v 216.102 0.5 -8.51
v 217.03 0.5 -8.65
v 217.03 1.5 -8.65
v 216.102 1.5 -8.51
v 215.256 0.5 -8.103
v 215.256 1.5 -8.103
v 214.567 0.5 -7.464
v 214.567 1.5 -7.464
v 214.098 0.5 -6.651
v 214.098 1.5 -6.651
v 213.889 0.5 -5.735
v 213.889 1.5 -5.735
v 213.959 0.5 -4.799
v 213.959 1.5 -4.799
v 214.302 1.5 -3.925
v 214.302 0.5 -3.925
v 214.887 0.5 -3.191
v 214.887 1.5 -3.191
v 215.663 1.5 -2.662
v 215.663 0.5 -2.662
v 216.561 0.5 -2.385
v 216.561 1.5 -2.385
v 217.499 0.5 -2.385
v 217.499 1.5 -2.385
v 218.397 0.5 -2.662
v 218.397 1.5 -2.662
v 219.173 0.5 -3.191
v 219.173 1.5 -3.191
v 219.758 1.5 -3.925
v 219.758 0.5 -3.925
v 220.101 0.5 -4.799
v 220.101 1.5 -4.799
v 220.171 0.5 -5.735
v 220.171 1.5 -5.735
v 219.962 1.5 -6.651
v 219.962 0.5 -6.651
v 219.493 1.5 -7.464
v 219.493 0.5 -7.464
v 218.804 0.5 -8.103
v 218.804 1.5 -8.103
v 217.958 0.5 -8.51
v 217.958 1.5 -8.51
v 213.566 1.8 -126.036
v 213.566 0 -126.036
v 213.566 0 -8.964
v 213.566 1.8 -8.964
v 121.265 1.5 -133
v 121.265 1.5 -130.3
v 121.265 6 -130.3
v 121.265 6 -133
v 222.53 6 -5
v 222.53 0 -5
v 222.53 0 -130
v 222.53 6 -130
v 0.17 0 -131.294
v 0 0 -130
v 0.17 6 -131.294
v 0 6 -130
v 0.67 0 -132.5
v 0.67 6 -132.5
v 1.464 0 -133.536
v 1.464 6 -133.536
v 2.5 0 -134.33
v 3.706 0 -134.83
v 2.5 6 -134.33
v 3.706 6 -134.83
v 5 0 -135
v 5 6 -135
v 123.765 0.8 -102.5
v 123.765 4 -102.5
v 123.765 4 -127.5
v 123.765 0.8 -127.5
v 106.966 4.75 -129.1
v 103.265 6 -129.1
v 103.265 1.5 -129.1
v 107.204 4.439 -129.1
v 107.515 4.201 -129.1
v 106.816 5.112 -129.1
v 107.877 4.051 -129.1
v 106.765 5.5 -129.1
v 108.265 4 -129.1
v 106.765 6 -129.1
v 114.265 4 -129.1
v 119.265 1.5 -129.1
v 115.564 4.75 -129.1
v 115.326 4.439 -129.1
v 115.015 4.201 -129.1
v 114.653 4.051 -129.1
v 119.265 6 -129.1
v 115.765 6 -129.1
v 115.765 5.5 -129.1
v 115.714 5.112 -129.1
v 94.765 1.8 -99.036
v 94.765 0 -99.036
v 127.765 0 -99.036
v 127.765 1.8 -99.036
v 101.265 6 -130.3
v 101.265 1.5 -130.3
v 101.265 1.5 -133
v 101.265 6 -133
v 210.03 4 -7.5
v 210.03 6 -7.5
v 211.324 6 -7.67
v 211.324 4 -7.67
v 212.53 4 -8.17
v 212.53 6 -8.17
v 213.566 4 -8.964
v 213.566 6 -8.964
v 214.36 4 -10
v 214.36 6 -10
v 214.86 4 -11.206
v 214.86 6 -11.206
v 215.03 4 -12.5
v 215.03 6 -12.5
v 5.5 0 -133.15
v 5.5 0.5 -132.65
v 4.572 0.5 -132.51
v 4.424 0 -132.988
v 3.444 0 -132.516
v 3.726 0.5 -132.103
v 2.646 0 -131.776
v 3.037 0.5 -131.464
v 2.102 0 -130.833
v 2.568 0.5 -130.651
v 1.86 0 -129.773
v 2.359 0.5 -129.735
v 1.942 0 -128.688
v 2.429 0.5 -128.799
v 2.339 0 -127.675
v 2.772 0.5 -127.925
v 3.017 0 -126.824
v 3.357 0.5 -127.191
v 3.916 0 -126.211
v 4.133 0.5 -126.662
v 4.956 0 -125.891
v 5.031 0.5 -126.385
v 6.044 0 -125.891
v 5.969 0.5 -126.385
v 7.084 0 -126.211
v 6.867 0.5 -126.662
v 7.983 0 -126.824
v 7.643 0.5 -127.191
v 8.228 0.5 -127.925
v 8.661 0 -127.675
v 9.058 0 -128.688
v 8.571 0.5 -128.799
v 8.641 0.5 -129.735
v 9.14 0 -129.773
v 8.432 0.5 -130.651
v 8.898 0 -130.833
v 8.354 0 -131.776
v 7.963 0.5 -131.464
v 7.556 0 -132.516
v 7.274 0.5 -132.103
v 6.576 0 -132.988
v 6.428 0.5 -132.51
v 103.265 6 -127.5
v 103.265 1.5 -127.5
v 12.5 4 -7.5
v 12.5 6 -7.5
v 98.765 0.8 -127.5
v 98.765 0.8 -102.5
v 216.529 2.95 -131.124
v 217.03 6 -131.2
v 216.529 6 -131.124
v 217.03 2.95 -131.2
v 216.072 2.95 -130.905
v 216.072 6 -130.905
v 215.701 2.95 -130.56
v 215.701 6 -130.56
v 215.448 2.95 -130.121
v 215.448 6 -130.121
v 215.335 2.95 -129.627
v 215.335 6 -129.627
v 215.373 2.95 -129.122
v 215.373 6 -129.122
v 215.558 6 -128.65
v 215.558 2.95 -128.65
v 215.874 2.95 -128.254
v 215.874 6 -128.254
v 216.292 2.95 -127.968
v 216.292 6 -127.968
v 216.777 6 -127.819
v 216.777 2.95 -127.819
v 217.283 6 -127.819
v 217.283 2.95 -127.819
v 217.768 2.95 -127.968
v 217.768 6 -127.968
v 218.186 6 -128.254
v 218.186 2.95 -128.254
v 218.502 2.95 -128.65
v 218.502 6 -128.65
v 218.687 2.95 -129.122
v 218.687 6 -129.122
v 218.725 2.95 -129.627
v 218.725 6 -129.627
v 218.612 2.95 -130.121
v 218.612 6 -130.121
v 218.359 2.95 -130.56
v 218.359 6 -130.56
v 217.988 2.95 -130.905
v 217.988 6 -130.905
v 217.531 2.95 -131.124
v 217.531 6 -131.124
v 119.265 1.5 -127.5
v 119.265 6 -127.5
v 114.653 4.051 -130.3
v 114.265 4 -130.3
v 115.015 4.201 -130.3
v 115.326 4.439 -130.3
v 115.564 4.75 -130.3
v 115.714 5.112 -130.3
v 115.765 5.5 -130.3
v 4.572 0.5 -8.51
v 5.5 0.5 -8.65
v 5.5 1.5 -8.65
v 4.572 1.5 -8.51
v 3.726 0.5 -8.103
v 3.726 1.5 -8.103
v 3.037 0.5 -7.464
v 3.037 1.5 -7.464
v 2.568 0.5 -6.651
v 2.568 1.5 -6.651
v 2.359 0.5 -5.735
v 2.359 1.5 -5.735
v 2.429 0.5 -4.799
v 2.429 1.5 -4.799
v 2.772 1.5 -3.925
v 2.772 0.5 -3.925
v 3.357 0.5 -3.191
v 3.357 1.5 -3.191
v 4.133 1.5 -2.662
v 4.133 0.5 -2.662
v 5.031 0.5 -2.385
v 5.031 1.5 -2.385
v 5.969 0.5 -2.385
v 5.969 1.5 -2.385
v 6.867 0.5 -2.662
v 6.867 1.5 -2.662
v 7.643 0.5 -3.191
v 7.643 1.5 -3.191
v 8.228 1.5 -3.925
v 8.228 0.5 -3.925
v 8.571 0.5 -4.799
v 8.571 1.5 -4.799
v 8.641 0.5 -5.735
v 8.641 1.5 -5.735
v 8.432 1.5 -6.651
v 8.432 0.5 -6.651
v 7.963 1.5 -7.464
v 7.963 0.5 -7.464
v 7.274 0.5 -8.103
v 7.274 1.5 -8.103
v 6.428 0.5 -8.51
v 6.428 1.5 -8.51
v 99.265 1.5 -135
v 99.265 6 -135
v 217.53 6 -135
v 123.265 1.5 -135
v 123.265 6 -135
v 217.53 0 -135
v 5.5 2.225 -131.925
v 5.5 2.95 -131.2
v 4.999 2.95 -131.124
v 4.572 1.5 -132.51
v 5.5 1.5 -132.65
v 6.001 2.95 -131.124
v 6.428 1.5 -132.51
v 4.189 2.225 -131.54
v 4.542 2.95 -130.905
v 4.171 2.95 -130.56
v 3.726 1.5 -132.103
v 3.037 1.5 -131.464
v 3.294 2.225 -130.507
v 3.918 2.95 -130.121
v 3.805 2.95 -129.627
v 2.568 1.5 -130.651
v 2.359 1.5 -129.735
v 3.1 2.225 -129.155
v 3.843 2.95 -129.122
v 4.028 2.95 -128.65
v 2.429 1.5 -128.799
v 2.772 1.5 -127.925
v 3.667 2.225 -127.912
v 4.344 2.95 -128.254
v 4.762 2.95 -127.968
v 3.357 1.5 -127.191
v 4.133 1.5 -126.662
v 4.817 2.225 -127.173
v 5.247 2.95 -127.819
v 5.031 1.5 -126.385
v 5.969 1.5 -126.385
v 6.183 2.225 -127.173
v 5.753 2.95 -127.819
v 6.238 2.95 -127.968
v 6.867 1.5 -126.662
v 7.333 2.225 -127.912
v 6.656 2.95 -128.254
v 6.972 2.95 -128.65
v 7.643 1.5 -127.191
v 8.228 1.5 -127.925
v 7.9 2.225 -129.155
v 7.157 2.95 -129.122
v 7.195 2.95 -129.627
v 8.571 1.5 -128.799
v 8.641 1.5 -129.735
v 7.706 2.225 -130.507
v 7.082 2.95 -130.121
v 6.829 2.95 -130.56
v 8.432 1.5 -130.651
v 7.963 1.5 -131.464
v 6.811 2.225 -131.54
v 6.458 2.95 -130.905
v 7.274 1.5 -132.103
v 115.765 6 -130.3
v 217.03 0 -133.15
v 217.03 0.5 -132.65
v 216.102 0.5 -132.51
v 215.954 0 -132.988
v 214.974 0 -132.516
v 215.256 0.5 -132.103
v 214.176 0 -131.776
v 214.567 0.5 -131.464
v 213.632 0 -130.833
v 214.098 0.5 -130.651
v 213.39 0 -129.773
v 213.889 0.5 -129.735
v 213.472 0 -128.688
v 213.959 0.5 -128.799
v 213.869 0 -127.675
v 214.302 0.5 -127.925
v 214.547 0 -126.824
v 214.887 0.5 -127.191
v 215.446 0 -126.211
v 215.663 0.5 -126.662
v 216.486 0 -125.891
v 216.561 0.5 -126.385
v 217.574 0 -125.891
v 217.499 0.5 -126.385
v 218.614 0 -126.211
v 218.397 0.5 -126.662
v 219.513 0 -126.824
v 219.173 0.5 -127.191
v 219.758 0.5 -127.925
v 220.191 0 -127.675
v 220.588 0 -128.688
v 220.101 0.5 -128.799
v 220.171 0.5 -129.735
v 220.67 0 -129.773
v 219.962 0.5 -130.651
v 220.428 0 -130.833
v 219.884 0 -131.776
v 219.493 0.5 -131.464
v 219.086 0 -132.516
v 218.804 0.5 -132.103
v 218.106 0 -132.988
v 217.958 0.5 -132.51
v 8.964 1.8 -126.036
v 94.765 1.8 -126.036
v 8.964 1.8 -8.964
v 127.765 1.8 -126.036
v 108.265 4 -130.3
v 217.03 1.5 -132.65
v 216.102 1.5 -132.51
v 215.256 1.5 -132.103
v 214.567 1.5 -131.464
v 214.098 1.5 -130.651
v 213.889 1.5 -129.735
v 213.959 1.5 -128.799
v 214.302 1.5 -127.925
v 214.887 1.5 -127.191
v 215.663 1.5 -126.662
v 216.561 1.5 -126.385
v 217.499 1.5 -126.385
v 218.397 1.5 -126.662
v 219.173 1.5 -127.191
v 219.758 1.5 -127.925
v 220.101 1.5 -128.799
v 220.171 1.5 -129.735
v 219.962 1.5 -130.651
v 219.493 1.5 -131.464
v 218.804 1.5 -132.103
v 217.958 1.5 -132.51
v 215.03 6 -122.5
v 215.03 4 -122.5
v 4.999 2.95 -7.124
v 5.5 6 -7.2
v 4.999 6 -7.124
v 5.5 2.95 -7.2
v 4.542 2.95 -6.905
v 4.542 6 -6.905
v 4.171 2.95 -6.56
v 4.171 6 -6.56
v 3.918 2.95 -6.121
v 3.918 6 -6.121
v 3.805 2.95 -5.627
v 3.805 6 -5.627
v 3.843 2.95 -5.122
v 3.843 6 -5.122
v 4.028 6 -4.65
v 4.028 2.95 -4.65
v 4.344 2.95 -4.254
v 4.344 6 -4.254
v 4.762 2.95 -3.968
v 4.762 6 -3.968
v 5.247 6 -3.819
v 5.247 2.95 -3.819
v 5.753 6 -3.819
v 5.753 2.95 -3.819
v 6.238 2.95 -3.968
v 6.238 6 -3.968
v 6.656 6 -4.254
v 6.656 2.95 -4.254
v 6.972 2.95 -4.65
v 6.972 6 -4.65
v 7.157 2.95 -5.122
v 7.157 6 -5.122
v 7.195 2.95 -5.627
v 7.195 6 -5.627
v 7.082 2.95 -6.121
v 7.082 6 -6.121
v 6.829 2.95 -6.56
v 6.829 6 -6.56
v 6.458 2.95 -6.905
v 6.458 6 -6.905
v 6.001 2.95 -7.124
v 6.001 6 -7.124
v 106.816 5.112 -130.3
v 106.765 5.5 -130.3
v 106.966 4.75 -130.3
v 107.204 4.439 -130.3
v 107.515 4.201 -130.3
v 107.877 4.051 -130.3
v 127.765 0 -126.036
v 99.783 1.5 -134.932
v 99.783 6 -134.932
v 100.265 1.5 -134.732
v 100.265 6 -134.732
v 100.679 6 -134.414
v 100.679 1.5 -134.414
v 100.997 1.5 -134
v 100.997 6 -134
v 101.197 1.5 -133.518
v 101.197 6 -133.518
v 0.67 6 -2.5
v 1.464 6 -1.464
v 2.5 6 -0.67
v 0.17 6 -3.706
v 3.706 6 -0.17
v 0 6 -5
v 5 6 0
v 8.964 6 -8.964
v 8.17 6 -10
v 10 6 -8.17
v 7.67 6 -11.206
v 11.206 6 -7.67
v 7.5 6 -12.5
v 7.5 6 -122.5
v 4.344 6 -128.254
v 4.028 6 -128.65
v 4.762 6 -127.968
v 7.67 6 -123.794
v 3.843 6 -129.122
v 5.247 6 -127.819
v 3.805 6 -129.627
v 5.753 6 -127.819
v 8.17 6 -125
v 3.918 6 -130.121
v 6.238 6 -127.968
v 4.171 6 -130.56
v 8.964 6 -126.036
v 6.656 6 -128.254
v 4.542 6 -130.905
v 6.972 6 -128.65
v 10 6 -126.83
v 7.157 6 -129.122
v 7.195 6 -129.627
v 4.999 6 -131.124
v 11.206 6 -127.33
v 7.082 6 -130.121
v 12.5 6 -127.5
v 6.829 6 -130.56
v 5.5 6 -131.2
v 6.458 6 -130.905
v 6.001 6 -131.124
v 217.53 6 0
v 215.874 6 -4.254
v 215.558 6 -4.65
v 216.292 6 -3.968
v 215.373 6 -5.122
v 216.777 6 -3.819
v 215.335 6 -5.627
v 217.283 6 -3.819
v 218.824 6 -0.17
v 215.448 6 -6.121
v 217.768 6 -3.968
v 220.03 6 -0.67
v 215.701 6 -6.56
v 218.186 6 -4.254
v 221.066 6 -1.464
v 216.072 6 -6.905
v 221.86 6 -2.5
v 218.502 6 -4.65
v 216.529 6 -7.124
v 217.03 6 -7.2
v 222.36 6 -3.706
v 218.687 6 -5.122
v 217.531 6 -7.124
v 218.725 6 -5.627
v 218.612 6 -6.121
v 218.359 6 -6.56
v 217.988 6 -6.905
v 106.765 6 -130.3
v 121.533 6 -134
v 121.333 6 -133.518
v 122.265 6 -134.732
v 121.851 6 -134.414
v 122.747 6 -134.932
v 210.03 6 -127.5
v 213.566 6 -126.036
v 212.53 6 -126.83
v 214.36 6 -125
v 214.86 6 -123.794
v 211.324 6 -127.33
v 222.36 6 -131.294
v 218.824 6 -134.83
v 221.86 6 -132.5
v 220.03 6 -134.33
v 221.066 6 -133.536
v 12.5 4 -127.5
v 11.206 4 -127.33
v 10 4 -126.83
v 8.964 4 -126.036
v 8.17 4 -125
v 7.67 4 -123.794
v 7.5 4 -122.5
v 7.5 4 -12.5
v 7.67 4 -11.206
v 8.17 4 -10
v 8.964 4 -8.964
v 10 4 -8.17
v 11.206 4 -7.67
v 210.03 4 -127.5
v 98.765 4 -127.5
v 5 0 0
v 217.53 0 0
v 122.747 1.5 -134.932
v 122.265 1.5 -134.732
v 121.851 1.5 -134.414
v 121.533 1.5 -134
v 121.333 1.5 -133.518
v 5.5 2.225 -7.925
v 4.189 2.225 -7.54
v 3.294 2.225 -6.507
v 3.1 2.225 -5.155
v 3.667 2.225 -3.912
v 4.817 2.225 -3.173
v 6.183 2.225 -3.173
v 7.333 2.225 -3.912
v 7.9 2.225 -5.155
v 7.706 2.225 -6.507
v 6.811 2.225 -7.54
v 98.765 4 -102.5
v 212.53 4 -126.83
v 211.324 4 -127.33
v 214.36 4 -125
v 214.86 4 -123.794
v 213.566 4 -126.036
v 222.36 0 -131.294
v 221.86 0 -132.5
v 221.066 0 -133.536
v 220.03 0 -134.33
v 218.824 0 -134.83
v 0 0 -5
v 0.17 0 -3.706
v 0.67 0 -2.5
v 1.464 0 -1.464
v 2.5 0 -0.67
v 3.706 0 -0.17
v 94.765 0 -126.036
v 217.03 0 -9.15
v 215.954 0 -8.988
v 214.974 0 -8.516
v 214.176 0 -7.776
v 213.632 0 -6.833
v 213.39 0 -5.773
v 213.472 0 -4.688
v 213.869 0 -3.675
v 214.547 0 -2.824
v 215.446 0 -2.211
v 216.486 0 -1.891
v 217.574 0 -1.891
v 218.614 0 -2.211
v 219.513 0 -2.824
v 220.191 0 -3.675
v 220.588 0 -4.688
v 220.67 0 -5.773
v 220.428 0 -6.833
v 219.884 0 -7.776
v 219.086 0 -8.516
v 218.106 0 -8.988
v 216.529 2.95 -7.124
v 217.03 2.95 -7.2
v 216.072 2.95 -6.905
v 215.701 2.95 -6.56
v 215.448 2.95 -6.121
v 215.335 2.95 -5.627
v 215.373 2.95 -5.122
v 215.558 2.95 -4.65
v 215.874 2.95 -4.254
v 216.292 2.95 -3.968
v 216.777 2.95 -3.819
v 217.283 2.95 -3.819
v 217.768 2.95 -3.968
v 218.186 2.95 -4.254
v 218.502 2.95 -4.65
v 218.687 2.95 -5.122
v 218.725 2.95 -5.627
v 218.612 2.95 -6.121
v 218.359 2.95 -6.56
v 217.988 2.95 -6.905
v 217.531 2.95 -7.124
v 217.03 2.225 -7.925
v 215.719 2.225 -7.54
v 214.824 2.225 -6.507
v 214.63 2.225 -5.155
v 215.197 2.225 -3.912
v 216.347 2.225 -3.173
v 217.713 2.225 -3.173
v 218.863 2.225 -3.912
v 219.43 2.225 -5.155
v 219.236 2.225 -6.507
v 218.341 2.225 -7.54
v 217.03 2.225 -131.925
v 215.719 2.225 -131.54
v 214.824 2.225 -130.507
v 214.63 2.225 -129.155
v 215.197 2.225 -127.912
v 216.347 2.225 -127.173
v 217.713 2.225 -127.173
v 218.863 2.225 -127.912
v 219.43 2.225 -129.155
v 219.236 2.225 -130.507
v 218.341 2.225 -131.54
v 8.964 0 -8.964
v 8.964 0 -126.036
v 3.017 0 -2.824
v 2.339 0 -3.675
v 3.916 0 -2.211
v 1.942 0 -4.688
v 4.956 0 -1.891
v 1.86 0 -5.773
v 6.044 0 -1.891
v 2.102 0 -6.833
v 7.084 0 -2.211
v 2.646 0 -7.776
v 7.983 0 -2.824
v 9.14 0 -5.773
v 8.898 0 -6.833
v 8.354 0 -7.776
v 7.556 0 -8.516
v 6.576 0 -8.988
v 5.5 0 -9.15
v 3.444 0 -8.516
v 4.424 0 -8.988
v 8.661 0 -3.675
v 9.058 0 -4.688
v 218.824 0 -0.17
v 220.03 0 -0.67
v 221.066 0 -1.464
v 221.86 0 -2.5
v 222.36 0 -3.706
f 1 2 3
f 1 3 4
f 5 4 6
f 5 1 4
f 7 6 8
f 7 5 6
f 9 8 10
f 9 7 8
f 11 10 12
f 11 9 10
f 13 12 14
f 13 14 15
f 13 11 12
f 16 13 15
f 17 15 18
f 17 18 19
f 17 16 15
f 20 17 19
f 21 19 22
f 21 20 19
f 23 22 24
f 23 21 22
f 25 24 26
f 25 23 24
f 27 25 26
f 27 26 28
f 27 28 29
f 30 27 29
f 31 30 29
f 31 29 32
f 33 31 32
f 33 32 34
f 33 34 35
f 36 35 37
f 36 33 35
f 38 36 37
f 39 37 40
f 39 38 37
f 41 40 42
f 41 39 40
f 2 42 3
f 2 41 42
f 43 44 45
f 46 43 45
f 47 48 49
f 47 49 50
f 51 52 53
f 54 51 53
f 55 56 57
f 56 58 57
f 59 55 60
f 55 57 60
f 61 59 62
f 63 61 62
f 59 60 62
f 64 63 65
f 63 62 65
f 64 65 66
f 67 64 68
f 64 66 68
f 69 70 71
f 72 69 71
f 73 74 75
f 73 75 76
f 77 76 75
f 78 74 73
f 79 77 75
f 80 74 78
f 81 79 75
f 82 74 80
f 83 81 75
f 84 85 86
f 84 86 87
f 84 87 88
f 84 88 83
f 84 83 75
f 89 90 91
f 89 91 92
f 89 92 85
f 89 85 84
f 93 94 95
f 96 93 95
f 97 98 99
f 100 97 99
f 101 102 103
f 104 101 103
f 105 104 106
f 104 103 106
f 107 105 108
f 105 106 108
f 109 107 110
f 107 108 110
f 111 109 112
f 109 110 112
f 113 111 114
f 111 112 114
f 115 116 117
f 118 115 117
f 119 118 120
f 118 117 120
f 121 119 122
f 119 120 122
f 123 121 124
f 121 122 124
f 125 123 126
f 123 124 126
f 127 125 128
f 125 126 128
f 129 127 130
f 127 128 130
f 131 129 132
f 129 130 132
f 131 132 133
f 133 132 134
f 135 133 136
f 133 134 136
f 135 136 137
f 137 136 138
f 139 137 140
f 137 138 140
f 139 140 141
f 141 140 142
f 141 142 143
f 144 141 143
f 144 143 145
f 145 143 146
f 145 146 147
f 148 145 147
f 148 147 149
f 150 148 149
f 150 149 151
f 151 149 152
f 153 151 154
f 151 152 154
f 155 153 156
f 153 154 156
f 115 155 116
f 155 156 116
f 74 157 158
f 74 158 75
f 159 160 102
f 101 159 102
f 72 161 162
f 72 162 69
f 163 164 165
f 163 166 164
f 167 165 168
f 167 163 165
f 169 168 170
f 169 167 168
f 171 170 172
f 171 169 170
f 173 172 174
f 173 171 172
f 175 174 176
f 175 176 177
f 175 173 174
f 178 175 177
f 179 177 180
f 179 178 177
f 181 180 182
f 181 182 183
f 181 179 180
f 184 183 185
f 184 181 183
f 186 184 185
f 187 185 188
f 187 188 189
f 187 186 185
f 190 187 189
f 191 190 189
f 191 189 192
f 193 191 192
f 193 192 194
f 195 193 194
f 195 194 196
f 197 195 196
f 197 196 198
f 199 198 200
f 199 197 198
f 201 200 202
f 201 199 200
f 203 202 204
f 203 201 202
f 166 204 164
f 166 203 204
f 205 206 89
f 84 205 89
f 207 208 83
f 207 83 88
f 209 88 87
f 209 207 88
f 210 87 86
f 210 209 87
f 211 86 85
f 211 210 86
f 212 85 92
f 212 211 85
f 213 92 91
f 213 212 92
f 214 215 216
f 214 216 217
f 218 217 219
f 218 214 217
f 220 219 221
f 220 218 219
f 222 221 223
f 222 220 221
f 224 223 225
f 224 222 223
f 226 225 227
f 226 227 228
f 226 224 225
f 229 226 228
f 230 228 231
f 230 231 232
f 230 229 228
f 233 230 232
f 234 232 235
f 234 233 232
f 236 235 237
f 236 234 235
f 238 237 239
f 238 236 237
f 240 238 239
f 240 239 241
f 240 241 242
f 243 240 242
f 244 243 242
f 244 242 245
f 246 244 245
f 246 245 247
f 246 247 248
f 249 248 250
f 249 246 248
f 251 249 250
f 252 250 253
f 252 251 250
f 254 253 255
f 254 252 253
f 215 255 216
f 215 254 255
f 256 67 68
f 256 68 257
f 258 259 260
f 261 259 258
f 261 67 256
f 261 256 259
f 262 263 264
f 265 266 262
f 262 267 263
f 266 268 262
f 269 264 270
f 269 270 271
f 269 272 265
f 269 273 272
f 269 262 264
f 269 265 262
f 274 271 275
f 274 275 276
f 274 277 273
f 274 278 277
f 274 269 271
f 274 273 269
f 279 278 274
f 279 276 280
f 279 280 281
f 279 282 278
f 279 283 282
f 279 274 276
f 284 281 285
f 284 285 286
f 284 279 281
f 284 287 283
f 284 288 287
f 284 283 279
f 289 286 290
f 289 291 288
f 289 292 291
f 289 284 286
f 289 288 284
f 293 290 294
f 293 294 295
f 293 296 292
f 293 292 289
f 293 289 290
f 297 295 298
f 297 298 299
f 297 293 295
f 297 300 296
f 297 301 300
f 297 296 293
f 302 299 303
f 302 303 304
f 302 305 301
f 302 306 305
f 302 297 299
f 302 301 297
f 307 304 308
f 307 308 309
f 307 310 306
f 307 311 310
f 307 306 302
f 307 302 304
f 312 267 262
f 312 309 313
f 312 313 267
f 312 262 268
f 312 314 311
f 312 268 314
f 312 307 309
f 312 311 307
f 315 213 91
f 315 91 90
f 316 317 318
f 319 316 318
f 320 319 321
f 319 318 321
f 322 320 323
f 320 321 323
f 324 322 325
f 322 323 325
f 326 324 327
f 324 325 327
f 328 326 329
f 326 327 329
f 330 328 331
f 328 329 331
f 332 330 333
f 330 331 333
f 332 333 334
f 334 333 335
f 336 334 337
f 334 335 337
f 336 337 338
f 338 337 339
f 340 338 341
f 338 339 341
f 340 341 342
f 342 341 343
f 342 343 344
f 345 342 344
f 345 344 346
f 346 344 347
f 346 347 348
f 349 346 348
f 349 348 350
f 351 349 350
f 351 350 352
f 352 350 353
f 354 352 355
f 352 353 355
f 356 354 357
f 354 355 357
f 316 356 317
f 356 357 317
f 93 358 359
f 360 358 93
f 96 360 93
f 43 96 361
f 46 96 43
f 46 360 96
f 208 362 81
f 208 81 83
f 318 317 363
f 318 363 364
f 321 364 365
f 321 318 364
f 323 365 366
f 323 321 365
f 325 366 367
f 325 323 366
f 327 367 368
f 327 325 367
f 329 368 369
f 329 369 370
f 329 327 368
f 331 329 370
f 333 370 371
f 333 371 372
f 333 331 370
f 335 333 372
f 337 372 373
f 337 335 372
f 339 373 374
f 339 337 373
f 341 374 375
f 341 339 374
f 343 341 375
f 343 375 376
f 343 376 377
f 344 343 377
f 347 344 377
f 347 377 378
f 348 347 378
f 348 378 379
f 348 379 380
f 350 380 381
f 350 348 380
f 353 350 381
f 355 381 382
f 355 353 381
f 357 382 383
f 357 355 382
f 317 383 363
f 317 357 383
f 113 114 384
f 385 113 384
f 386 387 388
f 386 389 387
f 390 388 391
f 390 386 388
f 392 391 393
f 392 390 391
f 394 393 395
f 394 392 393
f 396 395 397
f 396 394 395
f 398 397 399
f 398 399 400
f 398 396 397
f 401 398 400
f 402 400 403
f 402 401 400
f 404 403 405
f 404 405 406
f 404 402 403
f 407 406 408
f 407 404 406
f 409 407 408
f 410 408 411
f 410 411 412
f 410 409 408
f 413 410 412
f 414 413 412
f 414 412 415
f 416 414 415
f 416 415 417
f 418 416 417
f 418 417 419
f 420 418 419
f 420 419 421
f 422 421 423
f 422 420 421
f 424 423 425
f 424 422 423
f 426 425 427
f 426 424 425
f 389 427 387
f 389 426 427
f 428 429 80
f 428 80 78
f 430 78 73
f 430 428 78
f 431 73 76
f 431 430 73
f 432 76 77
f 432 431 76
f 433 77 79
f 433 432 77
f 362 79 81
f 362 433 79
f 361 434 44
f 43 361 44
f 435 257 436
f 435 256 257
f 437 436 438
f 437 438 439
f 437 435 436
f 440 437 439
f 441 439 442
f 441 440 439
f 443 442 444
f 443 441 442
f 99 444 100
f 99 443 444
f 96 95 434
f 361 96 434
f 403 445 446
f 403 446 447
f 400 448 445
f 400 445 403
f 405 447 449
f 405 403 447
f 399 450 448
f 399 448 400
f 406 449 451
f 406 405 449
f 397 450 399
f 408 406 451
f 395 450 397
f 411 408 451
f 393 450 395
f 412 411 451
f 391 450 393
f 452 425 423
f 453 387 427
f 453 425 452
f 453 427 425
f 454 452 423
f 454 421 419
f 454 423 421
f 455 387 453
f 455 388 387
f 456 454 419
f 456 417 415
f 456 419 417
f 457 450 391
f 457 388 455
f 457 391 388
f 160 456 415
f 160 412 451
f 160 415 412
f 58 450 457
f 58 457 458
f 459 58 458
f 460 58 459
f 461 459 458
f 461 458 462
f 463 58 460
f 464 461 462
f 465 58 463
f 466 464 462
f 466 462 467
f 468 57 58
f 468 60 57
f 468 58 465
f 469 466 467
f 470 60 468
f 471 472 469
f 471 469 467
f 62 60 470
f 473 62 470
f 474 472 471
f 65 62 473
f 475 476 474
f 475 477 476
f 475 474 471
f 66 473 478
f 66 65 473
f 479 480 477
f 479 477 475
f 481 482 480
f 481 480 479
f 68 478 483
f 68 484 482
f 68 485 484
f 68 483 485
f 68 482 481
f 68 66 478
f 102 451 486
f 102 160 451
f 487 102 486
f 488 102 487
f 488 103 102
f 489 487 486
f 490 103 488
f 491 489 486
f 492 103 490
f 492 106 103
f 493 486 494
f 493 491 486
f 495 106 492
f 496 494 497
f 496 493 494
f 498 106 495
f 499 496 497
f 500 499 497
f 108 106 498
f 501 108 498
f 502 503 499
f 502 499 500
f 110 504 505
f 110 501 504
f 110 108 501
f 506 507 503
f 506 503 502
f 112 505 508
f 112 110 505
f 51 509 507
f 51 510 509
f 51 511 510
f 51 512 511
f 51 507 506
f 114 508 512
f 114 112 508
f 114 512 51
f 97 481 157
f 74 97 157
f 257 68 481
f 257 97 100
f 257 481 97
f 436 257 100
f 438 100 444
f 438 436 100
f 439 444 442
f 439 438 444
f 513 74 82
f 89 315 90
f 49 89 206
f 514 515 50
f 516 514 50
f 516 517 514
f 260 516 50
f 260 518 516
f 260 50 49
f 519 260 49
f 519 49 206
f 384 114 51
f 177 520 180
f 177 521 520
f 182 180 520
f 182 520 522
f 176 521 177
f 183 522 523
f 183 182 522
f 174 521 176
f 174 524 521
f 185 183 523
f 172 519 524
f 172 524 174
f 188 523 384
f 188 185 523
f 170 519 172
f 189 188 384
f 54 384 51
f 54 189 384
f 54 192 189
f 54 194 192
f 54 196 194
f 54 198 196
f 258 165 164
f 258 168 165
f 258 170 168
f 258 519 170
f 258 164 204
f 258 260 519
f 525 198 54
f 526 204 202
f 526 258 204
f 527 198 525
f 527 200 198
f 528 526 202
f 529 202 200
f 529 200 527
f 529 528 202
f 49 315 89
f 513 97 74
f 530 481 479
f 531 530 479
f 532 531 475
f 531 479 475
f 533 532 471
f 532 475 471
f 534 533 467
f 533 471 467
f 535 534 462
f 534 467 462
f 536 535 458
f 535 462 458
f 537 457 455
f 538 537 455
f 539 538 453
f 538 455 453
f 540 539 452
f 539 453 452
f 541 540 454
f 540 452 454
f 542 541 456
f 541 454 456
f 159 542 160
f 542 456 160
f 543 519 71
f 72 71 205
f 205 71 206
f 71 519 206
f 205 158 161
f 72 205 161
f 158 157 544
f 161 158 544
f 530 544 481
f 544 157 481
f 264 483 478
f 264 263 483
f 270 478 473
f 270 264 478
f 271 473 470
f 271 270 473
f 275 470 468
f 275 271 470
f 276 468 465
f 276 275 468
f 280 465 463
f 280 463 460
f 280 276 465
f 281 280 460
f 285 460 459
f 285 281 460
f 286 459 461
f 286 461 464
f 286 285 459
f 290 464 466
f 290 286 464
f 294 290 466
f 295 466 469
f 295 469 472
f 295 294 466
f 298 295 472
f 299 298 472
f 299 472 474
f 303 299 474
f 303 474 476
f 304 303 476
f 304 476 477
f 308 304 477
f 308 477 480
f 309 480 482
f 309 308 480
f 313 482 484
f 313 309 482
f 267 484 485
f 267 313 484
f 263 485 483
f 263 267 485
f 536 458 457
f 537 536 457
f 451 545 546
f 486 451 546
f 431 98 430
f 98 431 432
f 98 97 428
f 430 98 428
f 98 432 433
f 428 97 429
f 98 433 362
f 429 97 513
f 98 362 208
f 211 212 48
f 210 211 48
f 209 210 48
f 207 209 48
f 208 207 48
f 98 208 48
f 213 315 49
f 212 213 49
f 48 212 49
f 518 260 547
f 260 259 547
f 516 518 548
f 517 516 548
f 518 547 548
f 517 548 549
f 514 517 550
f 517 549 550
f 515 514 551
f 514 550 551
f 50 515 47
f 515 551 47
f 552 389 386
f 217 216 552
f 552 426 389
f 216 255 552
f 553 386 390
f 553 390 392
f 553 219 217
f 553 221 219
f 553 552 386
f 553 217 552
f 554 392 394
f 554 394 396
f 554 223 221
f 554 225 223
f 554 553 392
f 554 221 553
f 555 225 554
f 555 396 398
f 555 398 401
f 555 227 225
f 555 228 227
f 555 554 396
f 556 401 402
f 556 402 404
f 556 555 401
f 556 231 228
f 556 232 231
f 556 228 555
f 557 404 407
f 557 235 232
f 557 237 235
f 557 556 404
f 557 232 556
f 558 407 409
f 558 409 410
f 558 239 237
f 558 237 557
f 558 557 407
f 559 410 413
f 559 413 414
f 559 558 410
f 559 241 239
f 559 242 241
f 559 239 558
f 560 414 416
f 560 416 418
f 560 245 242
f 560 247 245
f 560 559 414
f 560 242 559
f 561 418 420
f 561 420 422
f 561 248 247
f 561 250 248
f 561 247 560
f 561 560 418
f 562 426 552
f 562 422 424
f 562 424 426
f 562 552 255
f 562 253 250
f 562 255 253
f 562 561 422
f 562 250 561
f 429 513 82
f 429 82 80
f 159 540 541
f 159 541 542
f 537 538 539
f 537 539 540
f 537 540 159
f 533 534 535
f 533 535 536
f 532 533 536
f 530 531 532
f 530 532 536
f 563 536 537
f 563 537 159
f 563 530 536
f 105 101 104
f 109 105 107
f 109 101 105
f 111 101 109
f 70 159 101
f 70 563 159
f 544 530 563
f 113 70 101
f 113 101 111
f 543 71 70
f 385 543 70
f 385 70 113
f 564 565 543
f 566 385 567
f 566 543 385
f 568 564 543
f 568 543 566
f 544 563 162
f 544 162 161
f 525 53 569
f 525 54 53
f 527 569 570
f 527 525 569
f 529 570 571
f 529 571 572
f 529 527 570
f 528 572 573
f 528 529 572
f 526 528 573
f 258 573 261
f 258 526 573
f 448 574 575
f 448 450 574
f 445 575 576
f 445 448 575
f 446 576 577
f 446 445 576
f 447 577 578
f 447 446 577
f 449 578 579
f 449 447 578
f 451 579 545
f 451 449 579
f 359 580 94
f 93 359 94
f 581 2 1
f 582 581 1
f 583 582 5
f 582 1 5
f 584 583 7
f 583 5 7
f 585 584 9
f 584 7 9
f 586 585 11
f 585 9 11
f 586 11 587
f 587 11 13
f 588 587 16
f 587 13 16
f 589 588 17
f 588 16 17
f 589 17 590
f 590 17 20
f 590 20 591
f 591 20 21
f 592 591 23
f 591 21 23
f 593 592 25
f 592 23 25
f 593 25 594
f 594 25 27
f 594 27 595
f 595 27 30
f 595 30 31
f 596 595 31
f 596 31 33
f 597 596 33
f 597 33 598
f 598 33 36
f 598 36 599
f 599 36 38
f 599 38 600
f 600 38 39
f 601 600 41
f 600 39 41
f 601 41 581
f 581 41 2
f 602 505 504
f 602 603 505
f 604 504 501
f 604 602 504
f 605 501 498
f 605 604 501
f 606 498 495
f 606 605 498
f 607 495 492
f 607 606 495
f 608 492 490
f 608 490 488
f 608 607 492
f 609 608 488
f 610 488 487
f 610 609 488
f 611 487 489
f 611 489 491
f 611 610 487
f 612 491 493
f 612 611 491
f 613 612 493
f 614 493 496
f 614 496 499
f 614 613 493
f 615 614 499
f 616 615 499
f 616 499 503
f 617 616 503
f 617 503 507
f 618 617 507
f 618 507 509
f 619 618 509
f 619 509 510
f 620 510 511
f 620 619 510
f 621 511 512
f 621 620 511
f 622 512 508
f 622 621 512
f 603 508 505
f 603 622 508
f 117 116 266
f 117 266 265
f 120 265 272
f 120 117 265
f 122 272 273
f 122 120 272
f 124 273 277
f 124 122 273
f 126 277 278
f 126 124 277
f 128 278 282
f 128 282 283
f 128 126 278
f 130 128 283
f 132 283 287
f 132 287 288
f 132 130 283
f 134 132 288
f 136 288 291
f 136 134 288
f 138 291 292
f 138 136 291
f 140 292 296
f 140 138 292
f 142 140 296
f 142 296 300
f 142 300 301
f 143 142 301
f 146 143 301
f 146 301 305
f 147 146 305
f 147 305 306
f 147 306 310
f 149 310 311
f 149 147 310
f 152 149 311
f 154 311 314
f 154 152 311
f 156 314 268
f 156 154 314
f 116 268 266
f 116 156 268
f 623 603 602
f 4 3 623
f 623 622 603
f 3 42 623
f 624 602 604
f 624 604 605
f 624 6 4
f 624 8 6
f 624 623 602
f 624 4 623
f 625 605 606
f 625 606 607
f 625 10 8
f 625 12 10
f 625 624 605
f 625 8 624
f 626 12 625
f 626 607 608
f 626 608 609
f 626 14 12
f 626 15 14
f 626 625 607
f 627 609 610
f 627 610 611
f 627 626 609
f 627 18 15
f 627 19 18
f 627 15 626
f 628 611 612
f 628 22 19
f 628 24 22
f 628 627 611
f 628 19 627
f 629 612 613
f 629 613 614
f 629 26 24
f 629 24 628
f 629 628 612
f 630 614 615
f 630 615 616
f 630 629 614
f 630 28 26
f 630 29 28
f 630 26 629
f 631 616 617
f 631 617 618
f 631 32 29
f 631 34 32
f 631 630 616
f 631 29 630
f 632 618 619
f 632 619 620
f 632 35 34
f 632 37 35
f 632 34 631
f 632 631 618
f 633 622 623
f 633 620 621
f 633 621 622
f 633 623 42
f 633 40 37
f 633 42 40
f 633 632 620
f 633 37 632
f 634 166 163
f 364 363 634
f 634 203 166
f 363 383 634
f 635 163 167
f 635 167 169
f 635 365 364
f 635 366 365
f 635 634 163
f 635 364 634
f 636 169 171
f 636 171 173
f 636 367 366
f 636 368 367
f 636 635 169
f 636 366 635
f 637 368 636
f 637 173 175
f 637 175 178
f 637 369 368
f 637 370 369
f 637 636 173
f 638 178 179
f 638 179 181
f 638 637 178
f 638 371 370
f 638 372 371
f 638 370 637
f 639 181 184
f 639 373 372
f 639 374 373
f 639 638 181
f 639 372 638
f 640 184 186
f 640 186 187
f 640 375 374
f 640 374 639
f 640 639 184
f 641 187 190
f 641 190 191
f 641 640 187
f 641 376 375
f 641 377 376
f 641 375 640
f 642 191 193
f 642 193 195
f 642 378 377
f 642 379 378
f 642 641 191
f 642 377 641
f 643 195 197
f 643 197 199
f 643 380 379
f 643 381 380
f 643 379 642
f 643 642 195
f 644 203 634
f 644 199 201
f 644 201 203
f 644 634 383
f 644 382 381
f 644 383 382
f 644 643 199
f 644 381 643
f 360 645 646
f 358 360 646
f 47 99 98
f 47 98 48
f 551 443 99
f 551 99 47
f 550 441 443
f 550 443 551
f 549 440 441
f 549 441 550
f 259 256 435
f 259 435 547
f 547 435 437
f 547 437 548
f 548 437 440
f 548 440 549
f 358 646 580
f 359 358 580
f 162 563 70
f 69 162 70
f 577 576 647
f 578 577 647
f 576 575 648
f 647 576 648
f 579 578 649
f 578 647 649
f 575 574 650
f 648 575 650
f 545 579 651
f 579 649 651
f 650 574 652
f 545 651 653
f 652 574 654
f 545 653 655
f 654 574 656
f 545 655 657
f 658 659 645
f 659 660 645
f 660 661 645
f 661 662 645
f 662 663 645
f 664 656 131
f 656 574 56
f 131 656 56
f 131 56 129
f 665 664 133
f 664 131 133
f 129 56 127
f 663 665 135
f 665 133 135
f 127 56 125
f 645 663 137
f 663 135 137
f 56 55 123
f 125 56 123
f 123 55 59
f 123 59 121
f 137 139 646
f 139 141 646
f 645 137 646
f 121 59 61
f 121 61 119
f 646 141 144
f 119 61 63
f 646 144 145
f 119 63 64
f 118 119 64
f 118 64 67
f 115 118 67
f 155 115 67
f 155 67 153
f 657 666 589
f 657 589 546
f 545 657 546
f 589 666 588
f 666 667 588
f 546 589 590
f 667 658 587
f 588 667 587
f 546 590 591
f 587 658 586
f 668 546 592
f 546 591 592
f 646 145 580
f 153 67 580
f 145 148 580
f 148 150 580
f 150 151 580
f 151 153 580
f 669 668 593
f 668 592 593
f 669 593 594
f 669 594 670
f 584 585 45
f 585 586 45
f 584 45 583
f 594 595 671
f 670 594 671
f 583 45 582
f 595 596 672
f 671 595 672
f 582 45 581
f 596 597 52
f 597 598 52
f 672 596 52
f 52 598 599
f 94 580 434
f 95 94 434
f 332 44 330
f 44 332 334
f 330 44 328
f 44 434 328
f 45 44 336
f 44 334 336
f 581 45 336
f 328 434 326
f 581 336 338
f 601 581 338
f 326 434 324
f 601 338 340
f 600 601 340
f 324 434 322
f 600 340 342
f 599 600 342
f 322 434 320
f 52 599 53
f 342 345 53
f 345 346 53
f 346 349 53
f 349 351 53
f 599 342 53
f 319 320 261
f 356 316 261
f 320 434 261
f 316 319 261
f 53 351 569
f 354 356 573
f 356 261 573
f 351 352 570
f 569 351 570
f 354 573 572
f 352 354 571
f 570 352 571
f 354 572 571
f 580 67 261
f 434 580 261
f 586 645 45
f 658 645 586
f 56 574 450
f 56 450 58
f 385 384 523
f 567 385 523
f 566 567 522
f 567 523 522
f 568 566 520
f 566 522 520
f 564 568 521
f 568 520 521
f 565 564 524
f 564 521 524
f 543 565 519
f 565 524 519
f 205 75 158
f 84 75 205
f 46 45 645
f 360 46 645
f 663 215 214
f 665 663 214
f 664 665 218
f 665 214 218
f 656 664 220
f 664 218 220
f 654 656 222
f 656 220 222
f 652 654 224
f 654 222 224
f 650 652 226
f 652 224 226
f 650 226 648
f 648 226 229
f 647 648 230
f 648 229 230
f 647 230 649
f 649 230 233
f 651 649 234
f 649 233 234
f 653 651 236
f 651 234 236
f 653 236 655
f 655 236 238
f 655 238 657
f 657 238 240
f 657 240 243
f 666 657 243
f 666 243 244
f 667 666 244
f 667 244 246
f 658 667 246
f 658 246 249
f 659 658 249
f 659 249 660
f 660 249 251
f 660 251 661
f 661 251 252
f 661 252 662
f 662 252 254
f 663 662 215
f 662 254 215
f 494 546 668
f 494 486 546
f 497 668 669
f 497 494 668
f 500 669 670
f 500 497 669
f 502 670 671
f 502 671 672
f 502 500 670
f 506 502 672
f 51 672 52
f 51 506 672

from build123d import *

# Parameters (mm, degrees)
SKETCH1_W                                      = 222.53
SKETCH1_H                                      = 135
BOSS_EXTRUDE1_DEPTH                            = 6
FILLET1_R                                      = 5
CSK_FOR_M3_FLAT_HEAD_MACHINE_SCREW1_AT_2_COUNT = 2
CSK_FOR_M3_FLAT_HEAD_MACHINE_SCREW1_AT_2_PITCH = 211.53
CSK_FOR_M3_FLAT_HEAD_MACHINE_SCREW1_AT_3_COUNT = 2
CSK_FOR_M3_FLAT_HEAD_MACHINE_SCREW1_AT_3_PITCH = 245.195719579
CSK_FOR_M3_FLAT_HEAD_MACHINE_SCREW1_AT_4_COUNT = 2
CSK_FOR_M3_FLAT_HEAD_MACHINE_SCREW1_AT_4_PITCH = 124
CHAMFER1_SIZE                                  = 0.5
PCB_CUTOUT_DEPTH                               = 2
SKETCH8_W                                      = 20
SKETCH8_H                                      = 4.7
SKETCH8_W_2                                    = 16
SKETCH8_H_2                                    = 1.6
CABLE_RELIEF_DEPTH                             = 4.5
SKETCH9_W                                      = 25
SKETCH9_H                                      = 25
PI_CUTOUT_DEPTH                                = 3.2
USB_C_CUTOUT_REACH                             = 137
MOUSE_PAD_CUTOUT_DEPTH                         = 1.8
FILLET2_R                                      = 2


with BuildPart() as part:
    # Sketch1 → Boss-Extrude1 (new body)
    with BuildSketch(Plane(origin=(0, 0, 0), x_dir=(1, 0, 0), z_dir=(0, 1, 0))):
        with Locations((111.265, 67.5)):
            Rectangle(SKETCH1_W, SKETCH1_H)
    extrude(amount=BOSS_EXTRUDE1_DEPTH)

    # Fillet1
    fillet1_edges = [part.edges().sort_by_distance(p)[0] for p in [
        (0, 3, -135),
        (222.53, 3, -135),
        (222.53, 3, 0),
        (0, 3, 0),
    ]]
    fillet(fillet1_edges, radius=FILLET1_R)

    # Sketch4 → CSK for M3 Flat Head Machine Screw1 (revolve, cut)
    with BuildSketch(Plane(origin=(5.5, 0, -129.5), x_dir=(0, 0, -1), z_dir=(1, 0, 0))):
        Polygon((0, 0), (0, 6), (1.7, 6), (1.7, 2.95), (3.15, 1.5), (3.15, 0), align=None)
    csk_for_m3_flat_head_machine_screw1 = revolve(axis=Axis((5.5, -6.35, -129.5), (0, 1, 0)), mode=Mode.SUBTRACT)

    # CSK for M3 Flat Head Machine Screw1 at 2: CSK for M3 Flat Head Machine Screw1 ×2
    with Locations(*[(i * CSK_FOR_M3_FLAT_HEAD_MACHINE_SCREW1_AT_2_PITCH, 0, 0) for i in range(1, CSK_FOR_M3_FLAT_HEAD_MACHINE_SCREW1_AT_2_COUNT)]):
        add(csk_for_m3_flat_head_machine_screw1, mode=Mode.SUBTRACT)

    # CSK for M3 Flat Head Machine Screw1 at 3: CSK for M3 Flat Head Machine Screw1 ×2
    with Locations(*[Vector(0.862698584, 0, 0.505718453) * (i * CSK_FOR_M3_FLAT_HEAD_MACHINE_SCREW1_AT_3_PITCH) for i in range(1, CSK_FOR_M3_FLAT_HEAD_MACHINE_SCREW1_AT_3_COUNT)]):
        add(csk_for_m3_flat_head_machine_screw1, mode=Mode.SUBTRACT)

    # CSK for M3 Flat Head Machine Screw1 at 4: CSK for M3 Flat Head Machine Screw1 ×2
    with Locations(*[(0, 0, i * CSK_FOR_M3_FLAT_HEAD_MACHINE_SCREW1_AT_4_PITCH) for i in range(1, CSK_FOR_M3_FLAT_HEAD_MACHINE_SCREW1_AT_4_COUNT)]):
        add(csk_for_m3_flat_head_machine_screw1, mode=Mode.SUBTRACT)

    # Chamfer1
    chamfer1_edges = [part.edges().sort_by_distance(p)[0] for p in [
        (5.5, 0, -2.35),
        (217.03, 0, -2.35),
        (217.03, 0, -126.35),
        (5.5, 0, -126.35),
    ]]
    chamfer(chamfer1_edges, length=CHAMFER1_SIZE)

    # Sketch6 → PCB Cutout (cut)
    with BuildSketch(Plane(origin=(0, 6, 0), x_dir=(1, 0, 0), z_dir=(0, 1, 0))):
        with BuildLine():
            Line((12.5, 7.5), (210.03, 7.5))
            ThreePointArc((210.03, 7.5), (213.565533906, 8.964466094), (215.03, 12.5))
            Line((215.03, 12.5), (215.03, 122.5))
            ThreePointArc((215.03, 122.5), (213.565533906, 126.035533906), (210.03, 127.5))
            Line((210.03, 127.5), (12.5, 127.5))
            ThreePointArc((12.5, 127.5), (8.964466094, 126.035533906), (7.5, 122.5))
            Line((7.5, 122.5), (7.5, 12.5))
            ThreePointArc((7.5, 12.5), (8.964466094, 8.964466094), (12.5, 7.5))
        make_face()
    extrude(amount=-PCB_CUTOUT_DEPTH, mode=Mode.SUBTRACT)

    # Sketch8 → Cable Relief (cut)
    with BuildSketch(Plane(origin=(0, 6, 0), x_dir=(1, 0, 0), z_dir=(0, 1, 0))):
        with Locations((111.265, 132.65)):
            Rectangle(SKETCH8_W, SKETCH8_H)
        with Locations((111.265, 128.3)):
            Rectangle(SKETCH8_W_2, SKETCH8_H_2)
    extrude(amount=-CABLE_RELIEF_DEPTH, mode=Mode.SUBTRACT)

    # Sketch9 → Pi Cutout (cut)
    with BuildSketch(Plane(origin=(0, 4, 0), x_dir=(1, 0, 0), z_dir=(0, 1, 0))):
        with Locations((111.265, 115)):
            Rectangle(SKETCH9_W, SKETCH9_H)
    extrude(amount=-PI_CUTOUT_DEPTH, mode=Mode.SUBTRACT)

    # Sketch7 → USB C Cutout (cut, up to next)
    with BuildSketch(Plane(origin=(0, 0, -135), x_dir=(-1, 0, 0), z_dir=(0, 0, -1)), mode=Mode.PRIVATE) as usb_c_cutout_sk1:
        with BuildLine():
            Line((-114.265, 7.8), (-108.265, 7.8))
            ThreePointArc((-108.265, 7.8), (-107.204339828, 7.360660172), (-106.765, 6.3))
            Line((-106.765, 6.3), (-106.765, 5.5))
            ThreePointArc((-106.765, 5.5), (-107.204339828, 4.439339828), (-108.265, 4))
            Line((-108.265, 4), (-114.265, 4))
            ThreePointArc((-114.265, 4), (-115.325660172, 4.439339828), (-115.765, 5.5))
            Line((-115.765, 5.5), (-115.765, 6.3))
            ThreePointArc((-115.765, 6.3), (-115.325660172, 7.360660172), (-114.265, 7.8))
        make_face()
    usb_c_cutout_tool1 = extrude(usb_c_cutout_sk1.sketch, amount=-USB_C_CUTOUT_REACH, mode=Mode.PRIVATE) & part.part
    add(usb_c_cutout_tool1.solids().sort_by_distance((111.265, 5.9, -135))[0], mode=Mode.SUBTRACT)

    # Sketch5 → Mouse Pad Cutout (cut)
    with BuildSketch(Plane.XZ):
        Polygon((127.765, -126.035533906), (213.565533906, -126.035533906), (213.565533906, -8.964466094), (8.964466094, -8.964466094), (8.964466094, -126.035533906), (94.765, -126.035533906), (94.765, -99.035533906), (127.765, -99.035533906), align=None)
    extrude(amount=-MOUSE_PAD_CUTOUT_DEPTH, mode=Mode.SUBTRACT)

    # Fillet2
    fillet2_edges = [part.edges().sort_by_distance(p)[0] for p in [
        (101.265, 3.75, -135),
        (121.265, 3.75, -135),
    ]]
    fillet(fillet2_edges, radius=FILLET2_R)


solid = part.part
